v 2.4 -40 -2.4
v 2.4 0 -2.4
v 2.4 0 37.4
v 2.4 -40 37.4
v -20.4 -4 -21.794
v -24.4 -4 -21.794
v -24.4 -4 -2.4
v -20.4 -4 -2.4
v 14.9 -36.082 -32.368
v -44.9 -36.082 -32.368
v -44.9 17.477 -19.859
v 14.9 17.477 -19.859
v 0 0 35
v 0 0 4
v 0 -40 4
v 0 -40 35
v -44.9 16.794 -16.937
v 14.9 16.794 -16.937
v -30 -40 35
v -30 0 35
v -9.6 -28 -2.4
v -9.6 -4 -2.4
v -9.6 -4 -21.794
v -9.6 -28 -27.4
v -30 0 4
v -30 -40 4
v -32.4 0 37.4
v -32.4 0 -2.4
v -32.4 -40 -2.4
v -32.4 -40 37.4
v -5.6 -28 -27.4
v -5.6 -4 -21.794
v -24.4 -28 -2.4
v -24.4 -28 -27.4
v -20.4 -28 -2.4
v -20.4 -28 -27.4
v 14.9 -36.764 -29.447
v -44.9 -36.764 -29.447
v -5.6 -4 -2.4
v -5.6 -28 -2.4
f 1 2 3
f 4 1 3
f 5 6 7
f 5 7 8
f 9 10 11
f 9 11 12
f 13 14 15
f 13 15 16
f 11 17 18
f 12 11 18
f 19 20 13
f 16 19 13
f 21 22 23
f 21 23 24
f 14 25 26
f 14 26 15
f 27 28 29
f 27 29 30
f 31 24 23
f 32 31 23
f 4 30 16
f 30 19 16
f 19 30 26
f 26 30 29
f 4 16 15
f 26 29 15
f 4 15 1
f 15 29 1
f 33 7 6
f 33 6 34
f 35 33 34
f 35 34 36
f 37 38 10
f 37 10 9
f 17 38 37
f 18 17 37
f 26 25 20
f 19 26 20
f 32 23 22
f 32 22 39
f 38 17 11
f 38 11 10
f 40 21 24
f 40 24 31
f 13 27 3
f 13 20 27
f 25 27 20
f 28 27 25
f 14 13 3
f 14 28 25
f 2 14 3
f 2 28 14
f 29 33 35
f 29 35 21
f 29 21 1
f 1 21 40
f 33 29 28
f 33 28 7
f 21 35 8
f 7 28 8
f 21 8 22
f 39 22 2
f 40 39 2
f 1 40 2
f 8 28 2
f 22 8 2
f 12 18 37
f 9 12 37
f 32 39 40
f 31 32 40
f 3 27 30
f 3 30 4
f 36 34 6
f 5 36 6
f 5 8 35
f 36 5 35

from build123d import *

# Parameters (mm, degrees)
F0_W     = 34.8
F0_H     = 39.8
F0_W_2   = 30
F0_H_2   = 35
F1_DEPTH = 40
F2_W     = 4
F2_H     = 24
F3_DEPTH = 25
F5_DEPTH = 25
F6_DEPTH = 4
F7_W     = 59.8
F7_H     = 55
F7_W_2   = 4
F7_H_2   = 24.645994744
F8_DEPTH = 3


with BuildPart() as f1:
    # F0 (on Front) → F1 (new body)
    with BuildSketch(Plane.XZ):
        with Locations((-15, 17.5)):
            Rectangle(F0_W, F0_H)
        with Locations((-15, 17.5)):
            Rectangle(F0_W_2, F0_H_2, mode=Mode.SUBTRACT)
    extrude(amount=F1_DEPTH)

    # F2 (on face) → F3 (join)
    with BuildSketch(Plane(origin=(0, 0, -2.4), x_dir=(1, 0, 0), z_dir=(0, 0, -1))):
        with Locations((-22.4, 16)):
            Rectangle(F2_W, F2_H)
        with Locations((-7.6, 16)):
            Rectangle(F2_W, F2_H)
    extrude(amount=F3_DEPTH)

    # F4 (on face) → F5 (cut)
    with BuildSketch(Plane(origin=(-24.4, 0, 0), x_dir=(0, -1, 0), z_dir=(-1, 0, 0))):
        Polygon((4, -27.4), (28, -27.4), (4, -21.7941943556), align=None)
    extrude(amount=-F5_DEPTH, mode=Mode.SUBTRACT)

    # F6 (add): a face of the model
    f6_faces = [f1.faces().sort_by_distance(p)[0] for p in [
        (-15, -20, 0),
    ]]
    extrude(f6_faces, amount=F6_DEPTH)


with BuildPart() as f8:
    # F7 (on face) → F8 (new body)
    with BuildSketch(Plane(origin=(0, 4.6202838785, -19.7807095213), x_dir=(1, 0, 0), z_dir=(0, 0.2274530082, -0.9737890578))):
        with Locations((-15, 14.9983060425)):
            Rectangle(F7_W, F7_H)
        with Locations((-22.4, 21.1753086704)):
            Rectangle(F7_W_2, F7_H_2, mode=Mode.SUBTRACT)
        with Locations((-22.4, 21.1753086704)):
            Rectangle(F7_W_2, F7_H_2)
    extrude(amount=F8_DEPTH)


solid = Compound([f1.part, f8.part])
